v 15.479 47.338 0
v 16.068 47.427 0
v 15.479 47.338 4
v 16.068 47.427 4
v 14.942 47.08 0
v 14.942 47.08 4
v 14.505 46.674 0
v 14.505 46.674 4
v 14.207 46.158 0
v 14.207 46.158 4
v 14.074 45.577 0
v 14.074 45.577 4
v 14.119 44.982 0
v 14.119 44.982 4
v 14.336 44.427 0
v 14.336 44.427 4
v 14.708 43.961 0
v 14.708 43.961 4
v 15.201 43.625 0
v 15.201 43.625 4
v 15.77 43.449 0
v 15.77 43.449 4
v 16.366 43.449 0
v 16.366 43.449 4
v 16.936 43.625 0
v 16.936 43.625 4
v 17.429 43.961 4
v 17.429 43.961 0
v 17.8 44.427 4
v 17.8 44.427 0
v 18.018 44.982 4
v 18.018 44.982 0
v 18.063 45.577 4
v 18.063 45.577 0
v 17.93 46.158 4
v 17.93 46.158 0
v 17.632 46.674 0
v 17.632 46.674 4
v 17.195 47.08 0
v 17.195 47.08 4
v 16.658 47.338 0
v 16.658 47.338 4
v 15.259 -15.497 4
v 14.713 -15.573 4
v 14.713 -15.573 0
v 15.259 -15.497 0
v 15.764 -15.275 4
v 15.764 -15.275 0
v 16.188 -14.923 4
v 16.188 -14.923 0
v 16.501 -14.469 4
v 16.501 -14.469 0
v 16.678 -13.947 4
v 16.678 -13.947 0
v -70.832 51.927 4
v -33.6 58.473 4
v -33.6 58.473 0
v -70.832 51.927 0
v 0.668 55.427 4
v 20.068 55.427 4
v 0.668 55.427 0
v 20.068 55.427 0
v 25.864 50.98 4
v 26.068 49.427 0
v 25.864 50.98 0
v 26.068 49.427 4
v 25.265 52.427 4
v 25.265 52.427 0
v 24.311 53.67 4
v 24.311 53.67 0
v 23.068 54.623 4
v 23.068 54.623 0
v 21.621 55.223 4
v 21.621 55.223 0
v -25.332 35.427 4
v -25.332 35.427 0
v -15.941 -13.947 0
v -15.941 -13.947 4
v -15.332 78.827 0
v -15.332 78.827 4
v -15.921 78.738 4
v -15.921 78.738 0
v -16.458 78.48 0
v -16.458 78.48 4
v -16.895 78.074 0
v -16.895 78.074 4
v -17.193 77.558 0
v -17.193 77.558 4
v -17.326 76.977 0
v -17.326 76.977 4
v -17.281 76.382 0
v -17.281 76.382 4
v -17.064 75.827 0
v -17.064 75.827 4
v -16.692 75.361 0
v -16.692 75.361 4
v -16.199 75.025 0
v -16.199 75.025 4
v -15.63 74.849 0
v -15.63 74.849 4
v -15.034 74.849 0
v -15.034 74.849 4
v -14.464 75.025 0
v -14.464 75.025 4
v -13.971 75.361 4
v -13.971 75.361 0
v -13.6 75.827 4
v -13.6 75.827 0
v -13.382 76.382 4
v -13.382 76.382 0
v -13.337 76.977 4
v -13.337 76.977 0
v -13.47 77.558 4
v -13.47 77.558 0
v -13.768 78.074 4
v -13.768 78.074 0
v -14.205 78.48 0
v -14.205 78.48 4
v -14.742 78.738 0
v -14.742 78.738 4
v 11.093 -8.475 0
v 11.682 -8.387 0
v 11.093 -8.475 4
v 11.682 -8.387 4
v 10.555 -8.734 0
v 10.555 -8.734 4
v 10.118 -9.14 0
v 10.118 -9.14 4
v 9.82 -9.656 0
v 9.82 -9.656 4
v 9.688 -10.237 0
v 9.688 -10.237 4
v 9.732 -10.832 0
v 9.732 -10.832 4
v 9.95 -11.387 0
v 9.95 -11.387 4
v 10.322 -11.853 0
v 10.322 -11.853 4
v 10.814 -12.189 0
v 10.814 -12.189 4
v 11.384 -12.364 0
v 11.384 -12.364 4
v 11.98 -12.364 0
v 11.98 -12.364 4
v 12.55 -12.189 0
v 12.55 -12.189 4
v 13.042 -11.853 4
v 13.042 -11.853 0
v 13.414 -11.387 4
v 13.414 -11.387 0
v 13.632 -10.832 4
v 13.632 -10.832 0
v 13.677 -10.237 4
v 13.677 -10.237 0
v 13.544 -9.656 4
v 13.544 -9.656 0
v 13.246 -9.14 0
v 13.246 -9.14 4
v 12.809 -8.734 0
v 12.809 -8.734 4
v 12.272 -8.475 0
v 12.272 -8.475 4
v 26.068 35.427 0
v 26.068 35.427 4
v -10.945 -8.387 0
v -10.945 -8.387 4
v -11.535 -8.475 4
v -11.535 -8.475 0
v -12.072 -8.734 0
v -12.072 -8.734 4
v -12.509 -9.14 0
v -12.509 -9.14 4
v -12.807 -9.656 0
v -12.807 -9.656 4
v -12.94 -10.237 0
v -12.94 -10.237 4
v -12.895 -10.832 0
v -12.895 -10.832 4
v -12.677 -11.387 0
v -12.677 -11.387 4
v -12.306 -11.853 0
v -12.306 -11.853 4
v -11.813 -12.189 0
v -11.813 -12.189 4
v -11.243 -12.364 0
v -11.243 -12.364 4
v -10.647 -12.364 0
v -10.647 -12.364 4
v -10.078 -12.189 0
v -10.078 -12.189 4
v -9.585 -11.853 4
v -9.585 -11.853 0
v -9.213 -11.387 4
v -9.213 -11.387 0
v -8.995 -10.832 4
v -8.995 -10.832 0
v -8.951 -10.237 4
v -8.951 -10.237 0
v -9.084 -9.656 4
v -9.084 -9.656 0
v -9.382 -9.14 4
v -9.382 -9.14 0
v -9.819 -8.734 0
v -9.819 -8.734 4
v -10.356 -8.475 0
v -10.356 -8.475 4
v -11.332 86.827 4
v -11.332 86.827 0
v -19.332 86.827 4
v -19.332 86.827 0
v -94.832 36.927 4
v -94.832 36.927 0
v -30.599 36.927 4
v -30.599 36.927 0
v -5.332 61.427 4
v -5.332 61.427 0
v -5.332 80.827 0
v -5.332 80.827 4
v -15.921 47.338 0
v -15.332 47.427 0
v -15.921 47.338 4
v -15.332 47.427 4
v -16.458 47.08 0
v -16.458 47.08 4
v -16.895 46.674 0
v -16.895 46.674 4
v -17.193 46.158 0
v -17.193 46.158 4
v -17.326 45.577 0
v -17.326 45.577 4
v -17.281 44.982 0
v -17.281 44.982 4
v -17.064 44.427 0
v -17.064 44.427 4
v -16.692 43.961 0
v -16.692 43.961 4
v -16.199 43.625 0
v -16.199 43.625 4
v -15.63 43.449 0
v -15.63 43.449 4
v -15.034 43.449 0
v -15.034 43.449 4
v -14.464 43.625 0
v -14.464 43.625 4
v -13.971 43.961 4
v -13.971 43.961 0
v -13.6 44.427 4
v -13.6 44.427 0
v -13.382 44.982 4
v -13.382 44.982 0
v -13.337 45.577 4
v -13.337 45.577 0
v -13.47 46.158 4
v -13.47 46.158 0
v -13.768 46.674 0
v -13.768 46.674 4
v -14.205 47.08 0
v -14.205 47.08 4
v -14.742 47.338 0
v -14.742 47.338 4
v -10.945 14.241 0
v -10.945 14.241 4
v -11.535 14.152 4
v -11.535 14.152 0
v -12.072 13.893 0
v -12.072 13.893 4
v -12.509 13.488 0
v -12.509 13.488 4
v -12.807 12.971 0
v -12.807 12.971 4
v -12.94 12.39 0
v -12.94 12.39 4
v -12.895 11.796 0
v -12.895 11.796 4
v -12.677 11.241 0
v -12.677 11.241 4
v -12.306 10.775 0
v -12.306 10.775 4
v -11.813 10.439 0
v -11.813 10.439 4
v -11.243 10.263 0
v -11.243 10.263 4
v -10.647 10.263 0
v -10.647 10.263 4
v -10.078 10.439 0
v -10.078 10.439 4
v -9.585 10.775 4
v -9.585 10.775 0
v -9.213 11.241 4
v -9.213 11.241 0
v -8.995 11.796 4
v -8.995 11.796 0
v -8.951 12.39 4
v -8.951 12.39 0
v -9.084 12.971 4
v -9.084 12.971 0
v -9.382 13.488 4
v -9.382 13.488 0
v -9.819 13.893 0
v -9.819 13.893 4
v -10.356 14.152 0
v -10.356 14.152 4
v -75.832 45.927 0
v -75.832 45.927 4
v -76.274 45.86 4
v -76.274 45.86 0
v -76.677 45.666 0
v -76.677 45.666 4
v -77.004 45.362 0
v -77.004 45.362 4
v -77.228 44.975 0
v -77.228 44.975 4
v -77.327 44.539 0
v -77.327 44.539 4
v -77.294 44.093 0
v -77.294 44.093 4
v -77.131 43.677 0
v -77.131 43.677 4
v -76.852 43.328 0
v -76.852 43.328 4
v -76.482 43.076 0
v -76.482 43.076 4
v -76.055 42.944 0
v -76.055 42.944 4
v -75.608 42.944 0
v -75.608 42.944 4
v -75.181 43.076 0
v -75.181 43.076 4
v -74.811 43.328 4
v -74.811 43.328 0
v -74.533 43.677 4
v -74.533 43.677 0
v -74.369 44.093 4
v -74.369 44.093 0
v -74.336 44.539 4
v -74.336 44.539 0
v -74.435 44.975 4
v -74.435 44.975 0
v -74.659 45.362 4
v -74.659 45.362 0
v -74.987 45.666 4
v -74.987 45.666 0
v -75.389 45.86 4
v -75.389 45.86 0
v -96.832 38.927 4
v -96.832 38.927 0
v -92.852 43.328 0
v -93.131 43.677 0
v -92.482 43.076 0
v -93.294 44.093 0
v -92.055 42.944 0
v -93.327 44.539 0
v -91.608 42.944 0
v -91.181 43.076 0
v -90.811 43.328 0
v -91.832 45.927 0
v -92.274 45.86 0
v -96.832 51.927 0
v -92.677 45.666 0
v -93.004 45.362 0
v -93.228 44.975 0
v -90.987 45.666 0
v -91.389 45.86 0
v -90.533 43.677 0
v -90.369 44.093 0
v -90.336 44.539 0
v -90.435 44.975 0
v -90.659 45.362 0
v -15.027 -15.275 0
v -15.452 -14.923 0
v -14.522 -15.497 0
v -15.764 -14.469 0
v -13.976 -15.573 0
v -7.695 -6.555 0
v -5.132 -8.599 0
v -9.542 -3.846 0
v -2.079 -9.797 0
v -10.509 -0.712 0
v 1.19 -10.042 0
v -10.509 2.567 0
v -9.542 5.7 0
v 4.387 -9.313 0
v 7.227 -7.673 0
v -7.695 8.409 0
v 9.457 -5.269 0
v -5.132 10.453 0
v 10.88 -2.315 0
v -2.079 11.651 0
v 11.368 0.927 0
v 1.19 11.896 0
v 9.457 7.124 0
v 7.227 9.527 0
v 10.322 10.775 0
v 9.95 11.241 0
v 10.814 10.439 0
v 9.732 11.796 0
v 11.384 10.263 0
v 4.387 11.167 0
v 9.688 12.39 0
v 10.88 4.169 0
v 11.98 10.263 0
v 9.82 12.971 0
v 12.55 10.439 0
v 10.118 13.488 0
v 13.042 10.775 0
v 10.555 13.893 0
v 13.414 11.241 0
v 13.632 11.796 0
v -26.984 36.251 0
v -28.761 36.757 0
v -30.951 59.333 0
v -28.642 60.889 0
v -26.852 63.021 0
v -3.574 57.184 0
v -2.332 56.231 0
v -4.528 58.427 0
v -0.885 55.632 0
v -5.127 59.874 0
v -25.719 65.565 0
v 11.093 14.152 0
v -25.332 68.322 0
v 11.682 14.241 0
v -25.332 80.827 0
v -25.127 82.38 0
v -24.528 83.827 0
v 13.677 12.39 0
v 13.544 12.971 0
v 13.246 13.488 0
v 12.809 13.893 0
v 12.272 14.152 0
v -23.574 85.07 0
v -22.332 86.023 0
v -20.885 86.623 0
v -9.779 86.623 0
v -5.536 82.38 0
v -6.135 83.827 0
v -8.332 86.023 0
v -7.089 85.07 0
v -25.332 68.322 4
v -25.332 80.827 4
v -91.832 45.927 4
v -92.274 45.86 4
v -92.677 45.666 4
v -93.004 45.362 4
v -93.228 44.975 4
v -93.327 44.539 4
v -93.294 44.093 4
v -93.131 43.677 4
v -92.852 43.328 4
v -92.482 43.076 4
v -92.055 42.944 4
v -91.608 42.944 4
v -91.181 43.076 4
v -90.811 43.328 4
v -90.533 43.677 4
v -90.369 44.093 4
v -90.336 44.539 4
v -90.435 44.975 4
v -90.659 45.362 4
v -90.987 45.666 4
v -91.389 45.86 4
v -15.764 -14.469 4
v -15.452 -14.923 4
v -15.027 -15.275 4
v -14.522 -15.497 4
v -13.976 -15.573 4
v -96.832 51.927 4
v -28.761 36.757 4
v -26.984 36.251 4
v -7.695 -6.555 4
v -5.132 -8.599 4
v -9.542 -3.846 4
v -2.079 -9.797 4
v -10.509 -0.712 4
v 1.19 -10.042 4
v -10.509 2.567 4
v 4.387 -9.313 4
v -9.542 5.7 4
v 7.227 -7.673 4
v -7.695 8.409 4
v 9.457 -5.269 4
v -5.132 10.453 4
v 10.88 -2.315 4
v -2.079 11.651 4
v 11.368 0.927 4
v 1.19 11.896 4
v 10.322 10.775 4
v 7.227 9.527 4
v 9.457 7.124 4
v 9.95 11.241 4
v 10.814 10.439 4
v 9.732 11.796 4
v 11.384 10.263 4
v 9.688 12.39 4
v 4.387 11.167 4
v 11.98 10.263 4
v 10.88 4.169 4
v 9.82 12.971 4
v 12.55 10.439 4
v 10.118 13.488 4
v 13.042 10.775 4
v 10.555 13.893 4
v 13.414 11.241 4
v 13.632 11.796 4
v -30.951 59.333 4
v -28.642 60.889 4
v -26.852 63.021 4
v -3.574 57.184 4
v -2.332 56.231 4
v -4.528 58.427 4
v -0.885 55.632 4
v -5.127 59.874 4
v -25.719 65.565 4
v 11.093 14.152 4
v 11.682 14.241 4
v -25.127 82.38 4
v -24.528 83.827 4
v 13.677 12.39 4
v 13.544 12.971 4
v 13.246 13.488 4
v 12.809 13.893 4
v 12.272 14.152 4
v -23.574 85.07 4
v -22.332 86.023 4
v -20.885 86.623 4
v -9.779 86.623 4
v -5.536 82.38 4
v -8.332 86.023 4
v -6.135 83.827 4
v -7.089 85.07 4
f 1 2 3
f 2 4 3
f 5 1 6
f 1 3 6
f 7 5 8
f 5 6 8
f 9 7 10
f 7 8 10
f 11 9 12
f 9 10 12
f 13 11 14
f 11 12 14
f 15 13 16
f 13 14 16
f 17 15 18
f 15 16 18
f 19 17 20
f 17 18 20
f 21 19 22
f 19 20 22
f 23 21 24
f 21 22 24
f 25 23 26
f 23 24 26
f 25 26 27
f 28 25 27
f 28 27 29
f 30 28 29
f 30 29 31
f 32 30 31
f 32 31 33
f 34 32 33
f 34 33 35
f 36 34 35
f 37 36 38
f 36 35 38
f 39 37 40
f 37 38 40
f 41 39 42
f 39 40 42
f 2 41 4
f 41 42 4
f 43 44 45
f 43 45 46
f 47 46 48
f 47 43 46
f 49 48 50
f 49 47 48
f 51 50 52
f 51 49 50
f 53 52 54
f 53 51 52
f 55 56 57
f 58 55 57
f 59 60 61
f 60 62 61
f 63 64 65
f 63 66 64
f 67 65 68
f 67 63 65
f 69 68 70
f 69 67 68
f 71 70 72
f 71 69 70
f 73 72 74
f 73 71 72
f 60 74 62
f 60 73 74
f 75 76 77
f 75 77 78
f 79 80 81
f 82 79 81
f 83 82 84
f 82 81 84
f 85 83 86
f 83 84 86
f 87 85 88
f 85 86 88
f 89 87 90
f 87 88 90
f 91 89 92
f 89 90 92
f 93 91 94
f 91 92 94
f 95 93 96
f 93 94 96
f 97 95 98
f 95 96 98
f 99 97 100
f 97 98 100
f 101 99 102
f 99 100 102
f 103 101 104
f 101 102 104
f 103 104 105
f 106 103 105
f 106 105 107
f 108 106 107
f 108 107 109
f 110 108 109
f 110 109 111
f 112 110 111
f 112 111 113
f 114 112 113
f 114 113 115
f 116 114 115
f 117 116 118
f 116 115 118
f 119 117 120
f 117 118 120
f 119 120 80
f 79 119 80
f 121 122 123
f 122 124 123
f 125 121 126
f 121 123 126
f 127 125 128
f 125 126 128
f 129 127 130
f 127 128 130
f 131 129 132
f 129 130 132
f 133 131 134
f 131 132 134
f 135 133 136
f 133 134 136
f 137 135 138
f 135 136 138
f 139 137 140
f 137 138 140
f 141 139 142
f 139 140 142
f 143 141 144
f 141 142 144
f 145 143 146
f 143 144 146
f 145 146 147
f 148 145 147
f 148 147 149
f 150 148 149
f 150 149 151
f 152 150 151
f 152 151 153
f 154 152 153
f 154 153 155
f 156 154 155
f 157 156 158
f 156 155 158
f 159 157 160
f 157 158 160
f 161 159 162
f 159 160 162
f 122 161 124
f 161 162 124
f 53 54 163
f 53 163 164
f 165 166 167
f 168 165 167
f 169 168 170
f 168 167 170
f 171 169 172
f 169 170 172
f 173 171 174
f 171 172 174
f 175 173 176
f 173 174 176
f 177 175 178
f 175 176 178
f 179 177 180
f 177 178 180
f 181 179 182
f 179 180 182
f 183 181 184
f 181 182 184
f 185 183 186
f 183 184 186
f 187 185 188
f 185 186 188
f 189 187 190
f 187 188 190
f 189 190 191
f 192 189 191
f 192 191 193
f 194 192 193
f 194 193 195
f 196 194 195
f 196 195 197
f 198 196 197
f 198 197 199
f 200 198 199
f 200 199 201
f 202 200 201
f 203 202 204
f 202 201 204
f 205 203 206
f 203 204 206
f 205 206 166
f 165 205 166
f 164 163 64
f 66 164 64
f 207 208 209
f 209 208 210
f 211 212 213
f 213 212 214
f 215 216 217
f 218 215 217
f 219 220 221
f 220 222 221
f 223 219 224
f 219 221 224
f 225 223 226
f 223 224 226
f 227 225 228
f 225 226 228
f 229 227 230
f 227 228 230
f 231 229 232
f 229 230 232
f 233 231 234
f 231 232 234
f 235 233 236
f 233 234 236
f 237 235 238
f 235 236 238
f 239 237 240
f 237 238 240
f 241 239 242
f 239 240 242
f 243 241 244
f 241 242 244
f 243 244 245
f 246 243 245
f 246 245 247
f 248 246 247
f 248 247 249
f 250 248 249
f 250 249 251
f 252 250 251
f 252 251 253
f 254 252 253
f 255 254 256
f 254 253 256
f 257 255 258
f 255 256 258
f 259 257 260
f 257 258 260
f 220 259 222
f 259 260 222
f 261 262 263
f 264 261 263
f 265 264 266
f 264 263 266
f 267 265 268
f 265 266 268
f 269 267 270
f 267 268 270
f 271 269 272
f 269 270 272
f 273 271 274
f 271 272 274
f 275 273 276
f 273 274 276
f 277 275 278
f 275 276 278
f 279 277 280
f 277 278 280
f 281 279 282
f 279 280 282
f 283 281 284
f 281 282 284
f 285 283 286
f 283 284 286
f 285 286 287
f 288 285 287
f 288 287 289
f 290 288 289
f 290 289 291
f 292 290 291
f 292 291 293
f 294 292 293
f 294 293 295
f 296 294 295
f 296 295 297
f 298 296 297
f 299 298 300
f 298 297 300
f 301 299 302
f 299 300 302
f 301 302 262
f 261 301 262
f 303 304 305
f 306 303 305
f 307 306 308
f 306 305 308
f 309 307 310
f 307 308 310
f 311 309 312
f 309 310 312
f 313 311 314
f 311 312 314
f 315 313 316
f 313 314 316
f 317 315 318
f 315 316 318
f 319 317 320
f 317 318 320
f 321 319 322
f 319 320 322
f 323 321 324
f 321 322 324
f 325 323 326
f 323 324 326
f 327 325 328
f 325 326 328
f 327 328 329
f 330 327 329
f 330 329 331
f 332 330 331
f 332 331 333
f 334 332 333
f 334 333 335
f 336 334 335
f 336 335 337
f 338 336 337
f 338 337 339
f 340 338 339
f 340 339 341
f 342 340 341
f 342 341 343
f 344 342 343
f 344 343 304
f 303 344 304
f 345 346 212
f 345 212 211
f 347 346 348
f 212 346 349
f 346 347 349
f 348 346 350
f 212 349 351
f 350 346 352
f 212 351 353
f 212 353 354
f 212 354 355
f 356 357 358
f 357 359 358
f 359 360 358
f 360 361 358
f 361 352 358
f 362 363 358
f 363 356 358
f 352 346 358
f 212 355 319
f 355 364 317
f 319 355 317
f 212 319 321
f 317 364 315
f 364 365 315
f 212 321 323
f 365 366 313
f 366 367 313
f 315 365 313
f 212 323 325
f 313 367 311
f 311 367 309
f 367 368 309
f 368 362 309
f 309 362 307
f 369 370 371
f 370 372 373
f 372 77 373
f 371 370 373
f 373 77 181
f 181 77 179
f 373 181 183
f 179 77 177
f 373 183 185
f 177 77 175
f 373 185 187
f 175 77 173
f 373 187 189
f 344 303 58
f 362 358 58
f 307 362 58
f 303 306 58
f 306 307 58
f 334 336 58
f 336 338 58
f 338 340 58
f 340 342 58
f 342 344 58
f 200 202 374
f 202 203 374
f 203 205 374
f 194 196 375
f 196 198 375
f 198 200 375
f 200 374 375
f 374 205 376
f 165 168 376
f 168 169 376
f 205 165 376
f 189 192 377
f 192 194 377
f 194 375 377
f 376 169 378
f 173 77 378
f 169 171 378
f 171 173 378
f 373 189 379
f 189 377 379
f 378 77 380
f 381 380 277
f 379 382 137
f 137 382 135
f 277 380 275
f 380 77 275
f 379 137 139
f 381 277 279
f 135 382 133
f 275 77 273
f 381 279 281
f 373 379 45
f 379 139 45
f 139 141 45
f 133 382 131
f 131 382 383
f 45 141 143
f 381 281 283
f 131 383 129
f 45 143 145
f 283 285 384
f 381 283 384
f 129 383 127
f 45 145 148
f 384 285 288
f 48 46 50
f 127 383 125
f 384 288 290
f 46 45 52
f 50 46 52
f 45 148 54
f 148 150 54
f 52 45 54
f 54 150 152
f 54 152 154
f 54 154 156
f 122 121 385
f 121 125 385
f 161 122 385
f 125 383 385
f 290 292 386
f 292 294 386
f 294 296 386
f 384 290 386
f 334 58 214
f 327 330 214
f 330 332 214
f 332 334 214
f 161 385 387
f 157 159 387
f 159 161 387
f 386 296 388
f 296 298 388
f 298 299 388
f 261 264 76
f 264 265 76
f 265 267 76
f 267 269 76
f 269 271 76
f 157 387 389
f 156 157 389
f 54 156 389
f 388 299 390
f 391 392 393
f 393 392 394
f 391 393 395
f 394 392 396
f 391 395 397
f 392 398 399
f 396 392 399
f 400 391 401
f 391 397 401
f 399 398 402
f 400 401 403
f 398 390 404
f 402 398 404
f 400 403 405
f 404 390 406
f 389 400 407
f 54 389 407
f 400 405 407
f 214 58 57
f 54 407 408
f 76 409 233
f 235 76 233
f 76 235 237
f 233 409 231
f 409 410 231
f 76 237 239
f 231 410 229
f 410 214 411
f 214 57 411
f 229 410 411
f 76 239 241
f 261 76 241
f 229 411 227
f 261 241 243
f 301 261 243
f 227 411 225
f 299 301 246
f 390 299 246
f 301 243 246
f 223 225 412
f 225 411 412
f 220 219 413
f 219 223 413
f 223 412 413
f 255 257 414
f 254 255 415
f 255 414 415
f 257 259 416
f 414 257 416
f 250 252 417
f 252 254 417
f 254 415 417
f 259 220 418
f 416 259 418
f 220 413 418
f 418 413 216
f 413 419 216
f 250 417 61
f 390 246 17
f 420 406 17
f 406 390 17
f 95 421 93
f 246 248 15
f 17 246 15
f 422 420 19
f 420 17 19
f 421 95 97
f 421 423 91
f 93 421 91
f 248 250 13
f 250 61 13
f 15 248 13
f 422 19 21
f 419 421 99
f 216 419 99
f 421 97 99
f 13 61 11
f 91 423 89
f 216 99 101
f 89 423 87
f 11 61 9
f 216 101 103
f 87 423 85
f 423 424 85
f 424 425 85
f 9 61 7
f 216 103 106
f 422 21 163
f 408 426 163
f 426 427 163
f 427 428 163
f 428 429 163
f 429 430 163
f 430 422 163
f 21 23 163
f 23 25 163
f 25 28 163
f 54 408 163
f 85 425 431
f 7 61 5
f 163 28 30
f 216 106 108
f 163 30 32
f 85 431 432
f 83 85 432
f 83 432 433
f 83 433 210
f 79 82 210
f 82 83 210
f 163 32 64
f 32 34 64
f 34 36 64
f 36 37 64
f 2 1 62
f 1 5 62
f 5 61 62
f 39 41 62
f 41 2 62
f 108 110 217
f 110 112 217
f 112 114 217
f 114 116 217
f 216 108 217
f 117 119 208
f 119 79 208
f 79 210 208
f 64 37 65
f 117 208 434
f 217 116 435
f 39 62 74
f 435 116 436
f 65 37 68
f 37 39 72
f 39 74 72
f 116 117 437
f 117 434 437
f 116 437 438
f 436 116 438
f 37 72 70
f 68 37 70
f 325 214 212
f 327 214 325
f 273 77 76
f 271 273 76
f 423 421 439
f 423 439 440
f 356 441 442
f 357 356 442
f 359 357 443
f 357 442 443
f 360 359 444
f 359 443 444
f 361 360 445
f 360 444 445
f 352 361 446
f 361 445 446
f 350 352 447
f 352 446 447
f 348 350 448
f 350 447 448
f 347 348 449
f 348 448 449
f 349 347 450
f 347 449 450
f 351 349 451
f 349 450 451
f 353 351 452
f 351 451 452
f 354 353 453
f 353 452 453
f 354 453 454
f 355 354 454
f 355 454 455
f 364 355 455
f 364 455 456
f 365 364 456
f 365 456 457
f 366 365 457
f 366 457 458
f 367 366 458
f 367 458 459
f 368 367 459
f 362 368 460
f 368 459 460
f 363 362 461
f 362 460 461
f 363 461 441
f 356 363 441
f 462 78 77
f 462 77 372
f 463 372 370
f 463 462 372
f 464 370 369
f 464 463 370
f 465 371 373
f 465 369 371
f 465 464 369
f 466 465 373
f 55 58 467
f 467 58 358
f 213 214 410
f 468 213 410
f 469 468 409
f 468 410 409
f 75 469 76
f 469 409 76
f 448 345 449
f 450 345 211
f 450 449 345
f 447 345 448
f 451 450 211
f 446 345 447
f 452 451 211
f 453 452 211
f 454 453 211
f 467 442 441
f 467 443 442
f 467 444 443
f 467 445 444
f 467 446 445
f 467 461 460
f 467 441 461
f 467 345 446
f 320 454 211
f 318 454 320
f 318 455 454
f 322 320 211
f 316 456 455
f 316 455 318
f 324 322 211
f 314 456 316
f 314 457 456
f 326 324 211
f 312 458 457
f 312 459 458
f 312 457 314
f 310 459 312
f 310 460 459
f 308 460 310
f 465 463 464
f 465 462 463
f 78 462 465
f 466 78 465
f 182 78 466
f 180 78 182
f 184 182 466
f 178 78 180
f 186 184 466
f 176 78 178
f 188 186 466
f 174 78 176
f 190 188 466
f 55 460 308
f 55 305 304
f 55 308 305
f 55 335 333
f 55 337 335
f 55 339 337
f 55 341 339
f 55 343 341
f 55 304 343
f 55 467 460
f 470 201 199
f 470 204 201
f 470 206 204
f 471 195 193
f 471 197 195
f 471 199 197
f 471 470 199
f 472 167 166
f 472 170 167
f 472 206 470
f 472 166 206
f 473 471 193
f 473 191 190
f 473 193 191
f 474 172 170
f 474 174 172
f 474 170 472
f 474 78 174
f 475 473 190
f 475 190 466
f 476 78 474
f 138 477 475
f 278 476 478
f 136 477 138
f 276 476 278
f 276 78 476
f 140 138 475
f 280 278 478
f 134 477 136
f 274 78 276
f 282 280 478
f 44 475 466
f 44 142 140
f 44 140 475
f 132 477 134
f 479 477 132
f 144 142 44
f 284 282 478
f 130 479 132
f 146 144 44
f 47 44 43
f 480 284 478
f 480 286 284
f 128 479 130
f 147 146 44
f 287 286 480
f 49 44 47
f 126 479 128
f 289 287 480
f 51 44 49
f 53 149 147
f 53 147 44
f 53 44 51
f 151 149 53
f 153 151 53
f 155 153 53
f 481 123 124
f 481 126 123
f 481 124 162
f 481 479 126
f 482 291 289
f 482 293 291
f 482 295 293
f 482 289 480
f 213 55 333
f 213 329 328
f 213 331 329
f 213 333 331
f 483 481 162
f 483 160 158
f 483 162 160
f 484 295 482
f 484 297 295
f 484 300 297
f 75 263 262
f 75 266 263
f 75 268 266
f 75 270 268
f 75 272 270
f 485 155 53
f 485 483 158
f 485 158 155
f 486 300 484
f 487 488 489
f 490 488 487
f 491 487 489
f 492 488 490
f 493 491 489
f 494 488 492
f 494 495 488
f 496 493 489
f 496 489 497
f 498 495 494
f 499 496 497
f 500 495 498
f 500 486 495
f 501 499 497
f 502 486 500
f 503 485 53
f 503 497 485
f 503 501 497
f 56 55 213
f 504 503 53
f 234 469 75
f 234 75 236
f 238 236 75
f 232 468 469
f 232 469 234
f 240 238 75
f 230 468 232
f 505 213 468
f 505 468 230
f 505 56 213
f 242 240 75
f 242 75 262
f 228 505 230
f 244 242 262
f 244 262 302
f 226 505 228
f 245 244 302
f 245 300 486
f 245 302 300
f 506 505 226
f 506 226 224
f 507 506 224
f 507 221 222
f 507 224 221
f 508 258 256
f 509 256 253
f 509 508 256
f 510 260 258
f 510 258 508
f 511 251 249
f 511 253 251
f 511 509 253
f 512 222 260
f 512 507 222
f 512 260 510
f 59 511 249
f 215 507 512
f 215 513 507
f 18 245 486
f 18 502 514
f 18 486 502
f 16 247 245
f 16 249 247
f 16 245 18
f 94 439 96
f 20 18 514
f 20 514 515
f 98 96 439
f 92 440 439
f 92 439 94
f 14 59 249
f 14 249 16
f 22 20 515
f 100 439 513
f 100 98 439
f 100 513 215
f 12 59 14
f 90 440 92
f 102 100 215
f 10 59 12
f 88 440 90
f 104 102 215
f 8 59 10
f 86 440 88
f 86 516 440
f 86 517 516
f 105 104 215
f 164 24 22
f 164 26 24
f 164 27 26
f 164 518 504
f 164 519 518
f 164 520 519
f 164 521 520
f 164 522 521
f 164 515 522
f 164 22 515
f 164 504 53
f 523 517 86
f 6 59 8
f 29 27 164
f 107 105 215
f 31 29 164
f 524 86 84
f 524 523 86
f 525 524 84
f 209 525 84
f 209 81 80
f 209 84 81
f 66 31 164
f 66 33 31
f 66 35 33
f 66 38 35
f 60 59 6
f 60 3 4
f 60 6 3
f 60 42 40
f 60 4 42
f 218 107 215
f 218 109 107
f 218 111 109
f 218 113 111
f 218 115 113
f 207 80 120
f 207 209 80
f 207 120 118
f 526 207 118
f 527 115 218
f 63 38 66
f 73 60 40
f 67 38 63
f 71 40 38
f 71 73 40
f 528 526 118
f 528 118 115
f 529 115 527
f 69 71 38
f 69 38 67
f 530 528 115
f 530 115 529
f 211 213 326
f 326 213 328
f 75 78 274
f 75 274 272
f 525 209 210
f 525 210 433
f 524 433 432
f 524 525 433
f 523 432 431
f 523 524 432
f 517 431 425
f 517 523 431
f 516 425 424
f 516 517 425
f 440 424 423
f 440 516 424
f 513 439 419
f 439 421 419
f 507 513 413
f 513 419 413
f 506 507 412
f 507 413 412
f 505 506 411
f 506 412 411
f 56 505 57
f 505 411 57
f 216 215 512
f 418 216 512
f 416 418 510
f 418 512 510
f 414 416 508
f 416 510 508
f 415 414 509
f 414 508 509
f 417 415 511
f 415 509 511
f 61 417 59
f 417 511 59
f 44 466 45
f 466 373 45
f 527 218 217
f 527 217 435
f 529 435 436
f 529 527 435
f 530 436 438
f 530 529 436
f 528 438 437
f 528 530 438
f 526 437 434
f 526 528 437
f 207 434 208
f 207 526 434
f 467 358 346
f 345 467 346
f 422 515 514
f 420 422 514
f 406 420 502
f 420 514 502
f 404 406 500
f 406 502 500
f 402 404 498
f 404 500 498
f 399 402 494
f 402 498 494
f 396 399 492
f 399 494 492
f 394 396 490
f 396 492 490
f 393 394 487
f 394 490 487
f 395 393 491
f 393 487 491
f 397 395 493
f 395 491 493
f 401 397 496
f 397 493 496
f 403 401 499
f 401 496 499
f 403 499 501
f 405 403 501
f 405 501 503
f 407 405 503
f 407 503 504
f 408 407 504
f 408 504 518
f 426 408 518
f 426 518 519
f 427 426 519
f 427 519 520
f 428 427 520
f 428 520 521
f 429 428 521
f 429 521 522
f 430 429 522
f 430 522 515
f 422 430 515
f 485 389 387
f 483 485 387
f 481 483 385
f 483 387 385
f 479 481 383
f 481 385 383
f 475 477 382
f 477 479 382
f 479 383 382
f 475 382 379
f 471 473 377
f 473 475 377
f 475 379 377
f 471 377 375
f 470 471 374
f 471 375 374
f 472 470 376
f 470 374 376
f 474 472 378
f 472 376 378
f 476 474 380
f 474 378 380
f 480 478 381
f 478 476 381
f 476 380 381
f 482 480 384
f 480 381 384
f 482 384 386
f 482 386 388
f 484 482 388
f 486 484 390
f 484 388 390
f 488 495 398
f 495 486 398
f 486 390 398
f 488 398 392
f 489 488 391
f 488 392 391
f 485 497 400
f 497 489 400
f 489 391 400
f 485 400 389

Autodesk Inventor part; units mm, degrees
ref_plane "YZ Plane" through (0, 0, 0) normal (1, 0, 0) x (0, 1, 0)
ref_plane "XZ Plane" through (0, 0, 0) normal (0, 1, 0) x (-1, 0, 0)
ref_plane "XY Plane" through (0, 0, 0) normal (0, 0, 1) x (1, 0, 0)
sketch "Szkic1" plane through (0, 0, 0) normal (0, 0, 1) x (1, 0, 0)
  line L0 (-25.3316, -15.5729) -> (26.0684, -15.5729)
  line L1 (26.0684, -15.5729) -> (26.0684, 35.4271)
  line L2 (26.0684, 35.4271) -> (26.0684, 35.4271)
  line L3 (26.0684, 35.4271) -> (26.0684, 55.4271)
  line L4 (26.0684, 55.4271) -> (-5.3316, 55.4271)
  line L5 (-5.3316, 55.4271) -> (-5.3316, 86.8271)
  line L6 (-5.3316, 86.8271) -> (-25.3316, 86.8271)
  line L7 (-25.3316, -15.5729) -> (-25.3316, 86.8271)
  line L8 (-15.6316, 16.9271) -> (16.3684, 16.9271)
  line L9 (16.3684, 16.9271) -> (16.3684, -15.0729)
  line L10 (16.3684, -15.0729) -> (-15.6316, -15.0729)
  line L11 (-15.6316, -15.0729) -> (-15.6316, 16.9271)
  circle A0 centre (0.3684, 0.9271) radius 11
  circle A1 centre (0.3684, 0.9271) radius 16
  line L12 (-25.3316, 51.9271) -> (-96.8316, 51.9271)
  line L13 (-96.8316, 51.9271) -> (-96.8316, 36.9271)
  line L14 (-96.8316, 36.9271) -> (-25.3316, 36.9271)
  line L15 (-25.3316, 36.9271) -> (-25.3316, 51.9271)
  point P0 (0, 0)
  point P1 (-10.9453, 12.2408)
  point P2 (11.6821, 12.2408)
  point P3 (11.6821, -10.3866)
  point P4 (-10.9453, -10.3866)
  point P5 (16.0684, 45.4271)
  point P6 (-15.3316, 76.8271)
  point P7 (-15.3316, 45.4271)
  point P8 (-91.8316, 44.4271)
  point P9 (-75.8316, 44.4271)
  dimension "d0" = 20
  dimension "d1" = 20
  dimension "d2" = 51.4
  dimension "d3" = 51.4
  dimension "d4" = 34.5
  dimension "d5" = 25.7
  dimension "d6" = 51.4
  dimension "d7" = 51
  dimension "d8" = 32
  dimension "d9" = 32
  dimension "d10" = 16
  dimension "d11" = 16
  dimension "d12" = 22
  dimension "d13" = 32
  dimension "d23" = 10
  dimension "d24" = 10
  dimension "d25" = 10
  dimension "d26" = 10
  dimension "d27" = 10
  dimension "d28" = 10
  dimension "d45" = 71.5
  dimension "d46" = 15
  dimension "d47" = 18.5
  dimension "d57" = 5
  dimension "d58" = 16
  dimension "d59" = 7.5
  dimension "d60" = 7.5
extrude "Wyciągnięcie proste1" add sketch "Szkic1" along normal blind 4 contours L7 L6 L5 L4 L3 L1 L0 | L8 A1 L11 | L8 L9 A1 | A1 | A1 L10 L11 | L9 L10 A1
hole "Otwór1" at (0.3684, 0.9271, 0) at (-10.9453, 12.2408, 0) at (11.6821, 12.2408, 0) at (11.6821, -10.3866, 0) at (-10.9453, -10.3866, 0) direction (0, 0, 1) diameter 4 end through all
hole "Otwór2" at (16.0684, 45.4271, 0) at (-15.3316, 76.8271, 0) at (-15.3316, 45.4271, 0) direction (0, 0, 1) diameter 4 end through all
chamfer "Faza1" distance 51 distance2 9.7 1 edges at (-25.3316, -15.5729, 2) measured on face at (-25.3316, 18.5605, 1.3333)
chamfer "Faza2" distance 51 distance2 9.7 1 edges at (26.0684, -15.5729, 2) measured on face at (26.0684, 31.7605, 1.3333)
fillet "Zaokrąglenie1" radius 2 2 edges at (-15.6316, -15.5729, 2) (16.3684, -15.5729, 2)
fillet "Zaokrąglenie2" radius 6 4 edges at (-5.3316, 55.4271, 2) (26.0684, 55.4271, 2) (-5.3316, 86.8271, 2) (-25.3316, 86.8271, 2)
extrude "Wyciągnięcie proste2" add sketch "Szkic1" along normal blind 4 contours L14 L13 L12 L7
chamfer "Faza3" distance 8 distance2 45.5 1 edges at (-25.3316, 51.9271, 2) measured on face at (-25.3316, 61.5605, 1.3333)
fillet "Zaokrąglenie4" radius 10 2 edges at (-25.3316, 59.9271, 2) (-25.3316, 36.9271, 2)
chamfer "Faza4" distance 2 angle 45 1 edges at (-96.8316, 36.9271, 2)
hole "Otwór3" at (-91.8316, 44.4271, 0) at (-75.8316, 44.4271, 0) direction (0, 0, 1) diameter 3 end through all
equation "\"d1\" = d0"
equation "\"d2\" = d6"
equation "\"d3\" = d6"
equation "\"d6\" = 2 * d5"
equation "\"d10\" = 0.5 * d9"
equation "\"d11\" = 0.5 * d8"
equation "\"d25\" = 0.5 * d1"
equation "\"d26\" = 0.5 * d0"
equation "\"d27\" = d25"
equation "\"d28\" = d26"
properties part number "LC_ALU_4mm_Heatbed_Frame_Linear_Bearing_Mounting_Bracket_Cable_Chain"
